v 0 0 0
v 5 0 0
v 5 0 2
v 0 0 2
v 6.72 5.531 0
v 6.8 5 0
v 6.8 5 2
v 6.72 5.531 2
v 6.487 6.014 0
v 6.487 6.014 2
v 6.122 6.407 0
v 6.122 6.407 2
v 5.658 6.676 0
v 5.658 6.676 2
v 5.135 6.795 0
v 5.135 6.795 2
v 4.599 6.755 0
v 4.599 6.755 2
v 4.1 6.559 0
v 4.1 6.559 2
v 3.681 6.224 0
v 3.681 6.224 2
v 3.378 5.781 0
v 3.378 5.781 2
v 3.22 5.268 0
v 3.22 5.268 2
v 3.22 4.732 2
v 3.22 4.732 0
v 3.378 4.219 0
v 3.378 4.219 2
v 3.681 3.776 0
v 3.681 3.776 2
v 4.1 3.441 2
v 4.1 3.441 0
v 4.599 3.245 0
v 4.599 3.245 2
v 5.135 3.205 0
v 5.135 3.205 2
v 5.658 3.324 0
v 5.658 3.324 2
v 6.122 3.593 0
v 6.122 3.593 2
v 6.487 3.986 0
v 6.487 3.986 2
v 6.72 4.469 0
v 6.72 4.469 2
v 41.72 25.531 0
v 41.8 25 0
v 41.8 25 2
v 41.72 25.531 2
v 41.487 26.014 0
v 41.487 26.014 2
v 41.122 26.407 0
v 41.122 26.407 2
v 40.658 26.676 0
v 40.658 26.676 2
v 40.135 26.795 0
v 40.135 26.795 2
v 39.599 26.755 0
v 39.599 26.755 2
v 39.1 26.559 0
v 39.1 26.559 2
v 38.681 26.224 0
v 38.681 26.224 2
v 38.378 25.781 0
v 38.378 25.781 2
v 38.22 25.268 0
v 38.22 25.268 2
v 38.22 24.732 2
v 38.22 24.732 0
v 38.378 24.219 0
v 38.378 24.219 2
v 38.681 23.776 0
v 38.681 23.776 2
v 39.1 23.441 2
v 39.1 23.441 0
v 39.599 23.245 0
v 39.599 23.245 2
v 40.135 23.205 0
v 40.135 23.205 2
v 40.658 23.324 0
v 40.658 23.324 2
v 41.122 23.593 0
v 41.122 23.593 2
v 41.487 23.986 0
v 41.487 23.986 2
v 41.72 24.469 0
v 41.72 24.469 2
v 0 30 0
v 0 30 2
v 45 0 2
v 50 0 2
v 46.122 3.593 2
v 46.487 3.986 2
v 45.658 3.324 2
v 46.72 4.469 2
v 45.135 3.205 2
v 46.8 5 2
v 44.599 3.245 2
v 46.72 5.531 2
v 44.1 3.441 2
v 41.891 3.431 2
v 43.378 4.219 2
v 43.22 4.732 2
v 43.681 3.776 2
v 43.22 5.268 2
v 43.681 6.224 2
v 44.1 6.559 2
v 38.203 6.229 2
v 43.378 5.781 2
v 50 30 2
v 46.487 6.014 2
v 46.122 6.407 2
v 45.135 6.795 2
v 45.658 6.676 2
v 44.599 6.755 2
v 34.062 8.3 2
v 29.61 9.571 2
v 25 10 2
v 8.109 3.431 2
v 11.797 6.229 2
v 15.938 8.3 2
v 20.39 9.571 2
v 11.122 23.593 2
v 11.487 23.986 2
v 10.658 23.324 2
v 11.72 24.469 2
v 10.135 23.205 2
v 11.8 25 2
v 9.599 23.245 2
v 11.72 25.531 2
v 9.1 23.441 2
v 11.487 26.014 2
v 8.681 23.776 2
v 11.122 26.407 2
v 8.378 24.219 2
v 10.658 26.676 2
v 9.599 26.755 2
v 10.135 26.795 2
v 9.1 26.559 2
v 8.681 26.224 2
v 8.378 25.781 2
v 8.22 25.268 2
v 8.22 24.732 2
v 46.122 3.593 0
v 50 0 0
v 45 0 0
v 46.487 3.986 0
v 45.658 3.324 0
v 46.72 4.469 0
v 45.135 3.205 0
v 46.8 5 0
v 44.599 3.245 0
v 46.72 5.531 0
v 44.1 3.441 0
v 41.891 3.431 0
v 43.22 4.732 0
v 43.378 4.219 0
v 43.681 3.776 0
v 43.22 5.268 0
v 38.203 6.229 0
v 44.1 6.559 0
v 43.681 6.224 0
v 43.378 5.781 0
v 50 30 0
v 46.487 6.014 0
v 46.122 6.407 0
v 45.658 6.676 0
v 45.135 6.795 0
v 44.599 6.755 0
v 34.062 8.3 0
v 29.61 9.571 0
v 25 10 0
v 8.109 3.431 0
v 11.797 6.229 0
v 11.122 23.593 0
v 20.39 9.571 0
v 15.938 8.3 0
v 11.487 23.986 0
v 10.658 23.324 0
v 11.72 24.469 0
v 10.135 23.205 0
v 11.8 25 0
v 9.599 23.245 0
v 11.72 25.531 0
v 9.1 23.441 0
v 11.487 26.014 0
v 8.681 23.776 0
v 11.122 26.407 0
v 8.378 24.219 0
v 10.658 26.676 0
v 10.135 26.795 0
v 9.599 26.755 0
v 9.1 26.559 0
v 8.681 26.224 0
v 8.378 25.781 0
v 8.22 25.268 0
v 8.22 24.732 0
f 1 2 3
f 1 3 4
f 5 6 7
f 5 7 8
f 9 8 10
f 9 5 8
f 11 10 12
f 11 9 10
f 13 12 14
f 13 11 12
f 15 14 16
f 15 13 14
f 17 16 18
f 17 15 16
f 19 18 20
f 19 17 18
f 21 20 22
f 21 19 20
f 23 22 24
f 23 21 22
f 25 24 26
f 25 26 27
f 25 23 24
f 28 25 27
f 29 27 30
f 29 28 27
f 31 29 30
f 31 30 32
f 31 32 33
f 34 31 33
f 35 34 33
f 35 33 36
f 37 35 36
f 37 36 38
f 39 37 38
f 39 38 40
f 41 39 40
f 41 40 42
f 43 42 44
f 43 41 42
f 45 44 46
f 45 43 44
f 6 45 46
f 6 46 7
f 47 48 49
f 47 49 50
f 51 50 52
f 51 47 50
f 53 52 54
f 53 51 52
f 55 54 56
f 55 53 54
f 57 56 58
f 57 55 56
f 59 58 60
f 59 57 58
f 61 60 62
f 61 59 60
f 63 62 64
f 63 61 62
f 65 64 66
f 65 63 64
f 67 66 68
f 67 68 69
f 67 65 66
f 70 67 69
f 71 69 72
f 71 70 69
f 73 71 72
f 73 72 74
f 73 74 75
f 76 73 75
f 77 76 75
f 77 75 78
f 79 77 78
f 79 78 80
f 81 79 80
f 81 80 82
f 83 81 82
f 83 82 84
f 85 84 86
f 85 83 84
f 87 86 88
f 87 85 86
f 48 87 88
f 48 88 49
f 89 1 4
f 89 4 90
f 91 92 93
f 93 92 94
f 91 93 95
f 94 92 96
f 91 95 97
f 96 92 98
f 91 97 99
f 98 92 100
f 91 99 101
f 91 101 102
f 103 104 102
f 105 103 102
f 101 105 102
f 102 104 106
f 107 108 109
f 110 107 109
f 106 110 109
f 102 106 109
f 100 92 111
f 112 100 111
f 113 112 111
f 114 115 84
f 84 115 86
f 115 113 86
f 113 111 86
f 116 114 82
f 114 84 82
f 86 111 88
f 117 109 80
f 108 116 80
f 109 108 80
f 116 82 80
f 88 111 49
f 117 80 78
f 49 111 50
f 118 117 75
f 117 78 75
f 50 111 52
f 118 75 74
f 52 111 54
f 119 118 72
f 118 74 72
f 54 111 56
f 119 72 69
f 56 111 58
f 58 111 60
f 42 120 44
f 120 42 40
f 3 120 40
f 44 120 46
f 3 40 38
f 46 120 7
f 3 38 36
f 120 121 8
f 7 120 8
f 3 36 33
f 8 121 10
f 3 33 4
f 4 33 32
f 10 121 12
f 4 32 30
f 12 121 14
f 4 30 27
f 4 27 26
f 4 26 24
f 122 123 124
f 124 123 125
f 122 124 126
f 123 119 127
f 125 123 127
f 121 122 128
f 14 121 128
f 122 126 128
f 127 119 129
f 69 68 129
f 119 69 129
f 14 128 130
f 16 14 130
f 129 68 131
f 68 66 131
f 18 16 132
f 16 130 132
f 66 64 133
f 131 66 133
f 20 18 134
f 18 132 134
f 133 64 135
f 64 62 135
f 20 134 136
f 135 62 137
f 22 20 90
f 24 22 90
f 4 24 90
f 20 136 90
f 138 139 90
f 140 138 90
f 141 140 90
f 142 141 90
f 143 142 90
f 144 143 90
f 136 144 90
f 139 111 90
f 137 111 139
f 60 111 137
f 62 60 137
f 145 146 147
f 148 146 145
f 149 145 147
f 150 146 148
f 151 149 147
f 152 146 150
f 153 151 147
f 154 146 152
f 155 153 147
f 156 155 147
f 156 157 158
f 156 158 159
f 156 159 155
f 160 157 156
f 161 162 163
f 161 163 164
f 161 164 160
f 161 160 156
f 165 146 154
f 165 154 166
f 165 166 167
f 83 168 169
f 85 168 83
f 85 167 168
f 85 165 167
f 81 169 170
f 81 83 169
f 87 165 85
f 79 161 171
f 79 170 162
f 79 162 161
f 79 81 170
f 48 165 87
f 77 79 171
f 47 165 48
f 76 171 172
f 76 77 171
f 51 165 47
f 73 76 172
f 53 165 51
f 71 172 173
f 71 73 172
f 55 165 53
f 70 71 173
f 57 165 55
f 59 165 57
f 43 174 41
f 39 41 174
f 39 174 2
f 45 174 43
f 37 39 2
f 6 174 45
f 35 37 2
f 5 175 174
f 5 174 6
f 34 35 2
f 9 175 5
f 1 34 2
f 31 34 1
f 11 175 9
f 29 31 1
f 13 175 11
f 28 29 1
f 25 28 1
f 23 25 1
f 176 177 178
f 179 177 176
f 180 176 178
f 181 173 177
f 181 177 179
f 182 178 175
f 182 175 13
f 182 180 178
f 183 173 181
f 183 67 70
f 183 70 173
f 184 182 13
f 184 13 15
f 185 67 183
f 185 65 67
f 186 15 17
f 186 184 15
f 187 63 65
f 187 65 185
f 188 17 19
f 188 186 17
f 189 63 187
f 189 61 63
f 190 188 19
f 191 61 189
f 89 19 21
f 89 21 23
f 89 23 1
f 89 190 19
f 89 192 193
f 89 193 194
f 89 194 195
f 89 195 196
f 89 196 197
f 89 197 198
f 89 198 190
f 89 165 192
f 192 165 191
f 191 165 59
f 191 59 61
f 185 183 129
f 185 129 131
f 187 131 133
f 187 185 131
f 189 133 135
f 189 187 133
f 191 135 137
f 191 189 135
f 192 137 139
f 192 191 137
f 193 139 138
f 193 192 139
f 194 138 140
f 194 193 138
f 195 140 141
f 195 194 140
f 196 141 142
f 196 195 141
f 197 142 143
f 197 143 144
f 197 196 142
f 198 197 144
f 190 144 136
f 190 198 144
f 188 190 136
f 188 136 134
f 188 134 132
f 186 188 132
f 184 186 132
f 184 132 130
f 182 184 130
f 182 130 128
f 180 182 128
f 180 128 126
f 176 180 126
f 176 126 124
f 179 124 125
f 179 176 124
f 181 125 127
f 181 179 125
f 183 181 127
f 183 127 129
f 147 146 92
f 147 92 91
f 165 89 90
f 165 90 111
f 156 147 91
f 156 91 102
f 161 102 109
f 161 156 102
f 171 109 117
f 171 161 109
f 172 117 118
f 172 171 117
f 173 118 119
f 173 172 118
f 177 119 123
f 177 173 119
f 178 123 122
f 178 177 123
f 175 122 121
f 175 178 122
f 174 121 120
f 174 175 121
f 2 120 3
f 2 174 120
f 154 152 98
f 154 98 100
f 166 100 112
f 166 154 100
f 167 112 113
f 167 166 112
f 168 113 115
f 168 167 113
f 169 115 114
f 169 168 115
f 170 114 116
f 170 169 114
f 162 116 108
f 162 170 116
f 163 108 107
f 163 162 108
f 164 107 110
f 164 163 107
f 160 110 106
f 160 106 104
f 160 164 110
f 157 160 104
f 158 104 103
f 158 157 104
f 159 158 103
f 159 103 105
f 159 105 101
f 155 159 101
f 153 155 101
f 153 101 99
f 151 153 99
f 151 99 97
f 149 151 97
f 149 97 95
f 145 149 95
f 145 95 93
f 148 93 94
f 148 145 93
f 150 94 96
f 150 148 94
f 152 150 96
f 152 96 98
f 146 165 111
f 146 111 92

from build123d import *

# Parameters (mm, degrees)
SKETCH_R  = 1.8
PAD_DEPTH = 2


with BuildPart() as part:
    # Sketch → Pad (new body)
    with BuildSketch(Plane.XY):
        with BuildLine():
            Line((5, 0), (0, 0))
            Line((0, 0), (0, 30))
            Line((0, 30), (50, 30))
            Line((50, 30), (50, 0))
            Line((50, 0), (45, 0))
            ThreePointArc((45, 0), (25, 10), (5, 0))
        make_face()
        with Locations((5, 5)):
            Circle(SKETCH_R, mode=Mode.SUBTRACT)
        with Locations((45, 5)):
            Circle(SKETCH_R, mode=Mode.SUBTRACT)
        with Locations((40, 25)):
            Circle(SKETCH_R, mode=Mode.SUBTRACT)
        with Locations((10, 25)):
            Circle(SKETCH_R, mode=Mode.SUBTRACT)
    extrude(amount=PAD_DEPTH)


solid = part.part
